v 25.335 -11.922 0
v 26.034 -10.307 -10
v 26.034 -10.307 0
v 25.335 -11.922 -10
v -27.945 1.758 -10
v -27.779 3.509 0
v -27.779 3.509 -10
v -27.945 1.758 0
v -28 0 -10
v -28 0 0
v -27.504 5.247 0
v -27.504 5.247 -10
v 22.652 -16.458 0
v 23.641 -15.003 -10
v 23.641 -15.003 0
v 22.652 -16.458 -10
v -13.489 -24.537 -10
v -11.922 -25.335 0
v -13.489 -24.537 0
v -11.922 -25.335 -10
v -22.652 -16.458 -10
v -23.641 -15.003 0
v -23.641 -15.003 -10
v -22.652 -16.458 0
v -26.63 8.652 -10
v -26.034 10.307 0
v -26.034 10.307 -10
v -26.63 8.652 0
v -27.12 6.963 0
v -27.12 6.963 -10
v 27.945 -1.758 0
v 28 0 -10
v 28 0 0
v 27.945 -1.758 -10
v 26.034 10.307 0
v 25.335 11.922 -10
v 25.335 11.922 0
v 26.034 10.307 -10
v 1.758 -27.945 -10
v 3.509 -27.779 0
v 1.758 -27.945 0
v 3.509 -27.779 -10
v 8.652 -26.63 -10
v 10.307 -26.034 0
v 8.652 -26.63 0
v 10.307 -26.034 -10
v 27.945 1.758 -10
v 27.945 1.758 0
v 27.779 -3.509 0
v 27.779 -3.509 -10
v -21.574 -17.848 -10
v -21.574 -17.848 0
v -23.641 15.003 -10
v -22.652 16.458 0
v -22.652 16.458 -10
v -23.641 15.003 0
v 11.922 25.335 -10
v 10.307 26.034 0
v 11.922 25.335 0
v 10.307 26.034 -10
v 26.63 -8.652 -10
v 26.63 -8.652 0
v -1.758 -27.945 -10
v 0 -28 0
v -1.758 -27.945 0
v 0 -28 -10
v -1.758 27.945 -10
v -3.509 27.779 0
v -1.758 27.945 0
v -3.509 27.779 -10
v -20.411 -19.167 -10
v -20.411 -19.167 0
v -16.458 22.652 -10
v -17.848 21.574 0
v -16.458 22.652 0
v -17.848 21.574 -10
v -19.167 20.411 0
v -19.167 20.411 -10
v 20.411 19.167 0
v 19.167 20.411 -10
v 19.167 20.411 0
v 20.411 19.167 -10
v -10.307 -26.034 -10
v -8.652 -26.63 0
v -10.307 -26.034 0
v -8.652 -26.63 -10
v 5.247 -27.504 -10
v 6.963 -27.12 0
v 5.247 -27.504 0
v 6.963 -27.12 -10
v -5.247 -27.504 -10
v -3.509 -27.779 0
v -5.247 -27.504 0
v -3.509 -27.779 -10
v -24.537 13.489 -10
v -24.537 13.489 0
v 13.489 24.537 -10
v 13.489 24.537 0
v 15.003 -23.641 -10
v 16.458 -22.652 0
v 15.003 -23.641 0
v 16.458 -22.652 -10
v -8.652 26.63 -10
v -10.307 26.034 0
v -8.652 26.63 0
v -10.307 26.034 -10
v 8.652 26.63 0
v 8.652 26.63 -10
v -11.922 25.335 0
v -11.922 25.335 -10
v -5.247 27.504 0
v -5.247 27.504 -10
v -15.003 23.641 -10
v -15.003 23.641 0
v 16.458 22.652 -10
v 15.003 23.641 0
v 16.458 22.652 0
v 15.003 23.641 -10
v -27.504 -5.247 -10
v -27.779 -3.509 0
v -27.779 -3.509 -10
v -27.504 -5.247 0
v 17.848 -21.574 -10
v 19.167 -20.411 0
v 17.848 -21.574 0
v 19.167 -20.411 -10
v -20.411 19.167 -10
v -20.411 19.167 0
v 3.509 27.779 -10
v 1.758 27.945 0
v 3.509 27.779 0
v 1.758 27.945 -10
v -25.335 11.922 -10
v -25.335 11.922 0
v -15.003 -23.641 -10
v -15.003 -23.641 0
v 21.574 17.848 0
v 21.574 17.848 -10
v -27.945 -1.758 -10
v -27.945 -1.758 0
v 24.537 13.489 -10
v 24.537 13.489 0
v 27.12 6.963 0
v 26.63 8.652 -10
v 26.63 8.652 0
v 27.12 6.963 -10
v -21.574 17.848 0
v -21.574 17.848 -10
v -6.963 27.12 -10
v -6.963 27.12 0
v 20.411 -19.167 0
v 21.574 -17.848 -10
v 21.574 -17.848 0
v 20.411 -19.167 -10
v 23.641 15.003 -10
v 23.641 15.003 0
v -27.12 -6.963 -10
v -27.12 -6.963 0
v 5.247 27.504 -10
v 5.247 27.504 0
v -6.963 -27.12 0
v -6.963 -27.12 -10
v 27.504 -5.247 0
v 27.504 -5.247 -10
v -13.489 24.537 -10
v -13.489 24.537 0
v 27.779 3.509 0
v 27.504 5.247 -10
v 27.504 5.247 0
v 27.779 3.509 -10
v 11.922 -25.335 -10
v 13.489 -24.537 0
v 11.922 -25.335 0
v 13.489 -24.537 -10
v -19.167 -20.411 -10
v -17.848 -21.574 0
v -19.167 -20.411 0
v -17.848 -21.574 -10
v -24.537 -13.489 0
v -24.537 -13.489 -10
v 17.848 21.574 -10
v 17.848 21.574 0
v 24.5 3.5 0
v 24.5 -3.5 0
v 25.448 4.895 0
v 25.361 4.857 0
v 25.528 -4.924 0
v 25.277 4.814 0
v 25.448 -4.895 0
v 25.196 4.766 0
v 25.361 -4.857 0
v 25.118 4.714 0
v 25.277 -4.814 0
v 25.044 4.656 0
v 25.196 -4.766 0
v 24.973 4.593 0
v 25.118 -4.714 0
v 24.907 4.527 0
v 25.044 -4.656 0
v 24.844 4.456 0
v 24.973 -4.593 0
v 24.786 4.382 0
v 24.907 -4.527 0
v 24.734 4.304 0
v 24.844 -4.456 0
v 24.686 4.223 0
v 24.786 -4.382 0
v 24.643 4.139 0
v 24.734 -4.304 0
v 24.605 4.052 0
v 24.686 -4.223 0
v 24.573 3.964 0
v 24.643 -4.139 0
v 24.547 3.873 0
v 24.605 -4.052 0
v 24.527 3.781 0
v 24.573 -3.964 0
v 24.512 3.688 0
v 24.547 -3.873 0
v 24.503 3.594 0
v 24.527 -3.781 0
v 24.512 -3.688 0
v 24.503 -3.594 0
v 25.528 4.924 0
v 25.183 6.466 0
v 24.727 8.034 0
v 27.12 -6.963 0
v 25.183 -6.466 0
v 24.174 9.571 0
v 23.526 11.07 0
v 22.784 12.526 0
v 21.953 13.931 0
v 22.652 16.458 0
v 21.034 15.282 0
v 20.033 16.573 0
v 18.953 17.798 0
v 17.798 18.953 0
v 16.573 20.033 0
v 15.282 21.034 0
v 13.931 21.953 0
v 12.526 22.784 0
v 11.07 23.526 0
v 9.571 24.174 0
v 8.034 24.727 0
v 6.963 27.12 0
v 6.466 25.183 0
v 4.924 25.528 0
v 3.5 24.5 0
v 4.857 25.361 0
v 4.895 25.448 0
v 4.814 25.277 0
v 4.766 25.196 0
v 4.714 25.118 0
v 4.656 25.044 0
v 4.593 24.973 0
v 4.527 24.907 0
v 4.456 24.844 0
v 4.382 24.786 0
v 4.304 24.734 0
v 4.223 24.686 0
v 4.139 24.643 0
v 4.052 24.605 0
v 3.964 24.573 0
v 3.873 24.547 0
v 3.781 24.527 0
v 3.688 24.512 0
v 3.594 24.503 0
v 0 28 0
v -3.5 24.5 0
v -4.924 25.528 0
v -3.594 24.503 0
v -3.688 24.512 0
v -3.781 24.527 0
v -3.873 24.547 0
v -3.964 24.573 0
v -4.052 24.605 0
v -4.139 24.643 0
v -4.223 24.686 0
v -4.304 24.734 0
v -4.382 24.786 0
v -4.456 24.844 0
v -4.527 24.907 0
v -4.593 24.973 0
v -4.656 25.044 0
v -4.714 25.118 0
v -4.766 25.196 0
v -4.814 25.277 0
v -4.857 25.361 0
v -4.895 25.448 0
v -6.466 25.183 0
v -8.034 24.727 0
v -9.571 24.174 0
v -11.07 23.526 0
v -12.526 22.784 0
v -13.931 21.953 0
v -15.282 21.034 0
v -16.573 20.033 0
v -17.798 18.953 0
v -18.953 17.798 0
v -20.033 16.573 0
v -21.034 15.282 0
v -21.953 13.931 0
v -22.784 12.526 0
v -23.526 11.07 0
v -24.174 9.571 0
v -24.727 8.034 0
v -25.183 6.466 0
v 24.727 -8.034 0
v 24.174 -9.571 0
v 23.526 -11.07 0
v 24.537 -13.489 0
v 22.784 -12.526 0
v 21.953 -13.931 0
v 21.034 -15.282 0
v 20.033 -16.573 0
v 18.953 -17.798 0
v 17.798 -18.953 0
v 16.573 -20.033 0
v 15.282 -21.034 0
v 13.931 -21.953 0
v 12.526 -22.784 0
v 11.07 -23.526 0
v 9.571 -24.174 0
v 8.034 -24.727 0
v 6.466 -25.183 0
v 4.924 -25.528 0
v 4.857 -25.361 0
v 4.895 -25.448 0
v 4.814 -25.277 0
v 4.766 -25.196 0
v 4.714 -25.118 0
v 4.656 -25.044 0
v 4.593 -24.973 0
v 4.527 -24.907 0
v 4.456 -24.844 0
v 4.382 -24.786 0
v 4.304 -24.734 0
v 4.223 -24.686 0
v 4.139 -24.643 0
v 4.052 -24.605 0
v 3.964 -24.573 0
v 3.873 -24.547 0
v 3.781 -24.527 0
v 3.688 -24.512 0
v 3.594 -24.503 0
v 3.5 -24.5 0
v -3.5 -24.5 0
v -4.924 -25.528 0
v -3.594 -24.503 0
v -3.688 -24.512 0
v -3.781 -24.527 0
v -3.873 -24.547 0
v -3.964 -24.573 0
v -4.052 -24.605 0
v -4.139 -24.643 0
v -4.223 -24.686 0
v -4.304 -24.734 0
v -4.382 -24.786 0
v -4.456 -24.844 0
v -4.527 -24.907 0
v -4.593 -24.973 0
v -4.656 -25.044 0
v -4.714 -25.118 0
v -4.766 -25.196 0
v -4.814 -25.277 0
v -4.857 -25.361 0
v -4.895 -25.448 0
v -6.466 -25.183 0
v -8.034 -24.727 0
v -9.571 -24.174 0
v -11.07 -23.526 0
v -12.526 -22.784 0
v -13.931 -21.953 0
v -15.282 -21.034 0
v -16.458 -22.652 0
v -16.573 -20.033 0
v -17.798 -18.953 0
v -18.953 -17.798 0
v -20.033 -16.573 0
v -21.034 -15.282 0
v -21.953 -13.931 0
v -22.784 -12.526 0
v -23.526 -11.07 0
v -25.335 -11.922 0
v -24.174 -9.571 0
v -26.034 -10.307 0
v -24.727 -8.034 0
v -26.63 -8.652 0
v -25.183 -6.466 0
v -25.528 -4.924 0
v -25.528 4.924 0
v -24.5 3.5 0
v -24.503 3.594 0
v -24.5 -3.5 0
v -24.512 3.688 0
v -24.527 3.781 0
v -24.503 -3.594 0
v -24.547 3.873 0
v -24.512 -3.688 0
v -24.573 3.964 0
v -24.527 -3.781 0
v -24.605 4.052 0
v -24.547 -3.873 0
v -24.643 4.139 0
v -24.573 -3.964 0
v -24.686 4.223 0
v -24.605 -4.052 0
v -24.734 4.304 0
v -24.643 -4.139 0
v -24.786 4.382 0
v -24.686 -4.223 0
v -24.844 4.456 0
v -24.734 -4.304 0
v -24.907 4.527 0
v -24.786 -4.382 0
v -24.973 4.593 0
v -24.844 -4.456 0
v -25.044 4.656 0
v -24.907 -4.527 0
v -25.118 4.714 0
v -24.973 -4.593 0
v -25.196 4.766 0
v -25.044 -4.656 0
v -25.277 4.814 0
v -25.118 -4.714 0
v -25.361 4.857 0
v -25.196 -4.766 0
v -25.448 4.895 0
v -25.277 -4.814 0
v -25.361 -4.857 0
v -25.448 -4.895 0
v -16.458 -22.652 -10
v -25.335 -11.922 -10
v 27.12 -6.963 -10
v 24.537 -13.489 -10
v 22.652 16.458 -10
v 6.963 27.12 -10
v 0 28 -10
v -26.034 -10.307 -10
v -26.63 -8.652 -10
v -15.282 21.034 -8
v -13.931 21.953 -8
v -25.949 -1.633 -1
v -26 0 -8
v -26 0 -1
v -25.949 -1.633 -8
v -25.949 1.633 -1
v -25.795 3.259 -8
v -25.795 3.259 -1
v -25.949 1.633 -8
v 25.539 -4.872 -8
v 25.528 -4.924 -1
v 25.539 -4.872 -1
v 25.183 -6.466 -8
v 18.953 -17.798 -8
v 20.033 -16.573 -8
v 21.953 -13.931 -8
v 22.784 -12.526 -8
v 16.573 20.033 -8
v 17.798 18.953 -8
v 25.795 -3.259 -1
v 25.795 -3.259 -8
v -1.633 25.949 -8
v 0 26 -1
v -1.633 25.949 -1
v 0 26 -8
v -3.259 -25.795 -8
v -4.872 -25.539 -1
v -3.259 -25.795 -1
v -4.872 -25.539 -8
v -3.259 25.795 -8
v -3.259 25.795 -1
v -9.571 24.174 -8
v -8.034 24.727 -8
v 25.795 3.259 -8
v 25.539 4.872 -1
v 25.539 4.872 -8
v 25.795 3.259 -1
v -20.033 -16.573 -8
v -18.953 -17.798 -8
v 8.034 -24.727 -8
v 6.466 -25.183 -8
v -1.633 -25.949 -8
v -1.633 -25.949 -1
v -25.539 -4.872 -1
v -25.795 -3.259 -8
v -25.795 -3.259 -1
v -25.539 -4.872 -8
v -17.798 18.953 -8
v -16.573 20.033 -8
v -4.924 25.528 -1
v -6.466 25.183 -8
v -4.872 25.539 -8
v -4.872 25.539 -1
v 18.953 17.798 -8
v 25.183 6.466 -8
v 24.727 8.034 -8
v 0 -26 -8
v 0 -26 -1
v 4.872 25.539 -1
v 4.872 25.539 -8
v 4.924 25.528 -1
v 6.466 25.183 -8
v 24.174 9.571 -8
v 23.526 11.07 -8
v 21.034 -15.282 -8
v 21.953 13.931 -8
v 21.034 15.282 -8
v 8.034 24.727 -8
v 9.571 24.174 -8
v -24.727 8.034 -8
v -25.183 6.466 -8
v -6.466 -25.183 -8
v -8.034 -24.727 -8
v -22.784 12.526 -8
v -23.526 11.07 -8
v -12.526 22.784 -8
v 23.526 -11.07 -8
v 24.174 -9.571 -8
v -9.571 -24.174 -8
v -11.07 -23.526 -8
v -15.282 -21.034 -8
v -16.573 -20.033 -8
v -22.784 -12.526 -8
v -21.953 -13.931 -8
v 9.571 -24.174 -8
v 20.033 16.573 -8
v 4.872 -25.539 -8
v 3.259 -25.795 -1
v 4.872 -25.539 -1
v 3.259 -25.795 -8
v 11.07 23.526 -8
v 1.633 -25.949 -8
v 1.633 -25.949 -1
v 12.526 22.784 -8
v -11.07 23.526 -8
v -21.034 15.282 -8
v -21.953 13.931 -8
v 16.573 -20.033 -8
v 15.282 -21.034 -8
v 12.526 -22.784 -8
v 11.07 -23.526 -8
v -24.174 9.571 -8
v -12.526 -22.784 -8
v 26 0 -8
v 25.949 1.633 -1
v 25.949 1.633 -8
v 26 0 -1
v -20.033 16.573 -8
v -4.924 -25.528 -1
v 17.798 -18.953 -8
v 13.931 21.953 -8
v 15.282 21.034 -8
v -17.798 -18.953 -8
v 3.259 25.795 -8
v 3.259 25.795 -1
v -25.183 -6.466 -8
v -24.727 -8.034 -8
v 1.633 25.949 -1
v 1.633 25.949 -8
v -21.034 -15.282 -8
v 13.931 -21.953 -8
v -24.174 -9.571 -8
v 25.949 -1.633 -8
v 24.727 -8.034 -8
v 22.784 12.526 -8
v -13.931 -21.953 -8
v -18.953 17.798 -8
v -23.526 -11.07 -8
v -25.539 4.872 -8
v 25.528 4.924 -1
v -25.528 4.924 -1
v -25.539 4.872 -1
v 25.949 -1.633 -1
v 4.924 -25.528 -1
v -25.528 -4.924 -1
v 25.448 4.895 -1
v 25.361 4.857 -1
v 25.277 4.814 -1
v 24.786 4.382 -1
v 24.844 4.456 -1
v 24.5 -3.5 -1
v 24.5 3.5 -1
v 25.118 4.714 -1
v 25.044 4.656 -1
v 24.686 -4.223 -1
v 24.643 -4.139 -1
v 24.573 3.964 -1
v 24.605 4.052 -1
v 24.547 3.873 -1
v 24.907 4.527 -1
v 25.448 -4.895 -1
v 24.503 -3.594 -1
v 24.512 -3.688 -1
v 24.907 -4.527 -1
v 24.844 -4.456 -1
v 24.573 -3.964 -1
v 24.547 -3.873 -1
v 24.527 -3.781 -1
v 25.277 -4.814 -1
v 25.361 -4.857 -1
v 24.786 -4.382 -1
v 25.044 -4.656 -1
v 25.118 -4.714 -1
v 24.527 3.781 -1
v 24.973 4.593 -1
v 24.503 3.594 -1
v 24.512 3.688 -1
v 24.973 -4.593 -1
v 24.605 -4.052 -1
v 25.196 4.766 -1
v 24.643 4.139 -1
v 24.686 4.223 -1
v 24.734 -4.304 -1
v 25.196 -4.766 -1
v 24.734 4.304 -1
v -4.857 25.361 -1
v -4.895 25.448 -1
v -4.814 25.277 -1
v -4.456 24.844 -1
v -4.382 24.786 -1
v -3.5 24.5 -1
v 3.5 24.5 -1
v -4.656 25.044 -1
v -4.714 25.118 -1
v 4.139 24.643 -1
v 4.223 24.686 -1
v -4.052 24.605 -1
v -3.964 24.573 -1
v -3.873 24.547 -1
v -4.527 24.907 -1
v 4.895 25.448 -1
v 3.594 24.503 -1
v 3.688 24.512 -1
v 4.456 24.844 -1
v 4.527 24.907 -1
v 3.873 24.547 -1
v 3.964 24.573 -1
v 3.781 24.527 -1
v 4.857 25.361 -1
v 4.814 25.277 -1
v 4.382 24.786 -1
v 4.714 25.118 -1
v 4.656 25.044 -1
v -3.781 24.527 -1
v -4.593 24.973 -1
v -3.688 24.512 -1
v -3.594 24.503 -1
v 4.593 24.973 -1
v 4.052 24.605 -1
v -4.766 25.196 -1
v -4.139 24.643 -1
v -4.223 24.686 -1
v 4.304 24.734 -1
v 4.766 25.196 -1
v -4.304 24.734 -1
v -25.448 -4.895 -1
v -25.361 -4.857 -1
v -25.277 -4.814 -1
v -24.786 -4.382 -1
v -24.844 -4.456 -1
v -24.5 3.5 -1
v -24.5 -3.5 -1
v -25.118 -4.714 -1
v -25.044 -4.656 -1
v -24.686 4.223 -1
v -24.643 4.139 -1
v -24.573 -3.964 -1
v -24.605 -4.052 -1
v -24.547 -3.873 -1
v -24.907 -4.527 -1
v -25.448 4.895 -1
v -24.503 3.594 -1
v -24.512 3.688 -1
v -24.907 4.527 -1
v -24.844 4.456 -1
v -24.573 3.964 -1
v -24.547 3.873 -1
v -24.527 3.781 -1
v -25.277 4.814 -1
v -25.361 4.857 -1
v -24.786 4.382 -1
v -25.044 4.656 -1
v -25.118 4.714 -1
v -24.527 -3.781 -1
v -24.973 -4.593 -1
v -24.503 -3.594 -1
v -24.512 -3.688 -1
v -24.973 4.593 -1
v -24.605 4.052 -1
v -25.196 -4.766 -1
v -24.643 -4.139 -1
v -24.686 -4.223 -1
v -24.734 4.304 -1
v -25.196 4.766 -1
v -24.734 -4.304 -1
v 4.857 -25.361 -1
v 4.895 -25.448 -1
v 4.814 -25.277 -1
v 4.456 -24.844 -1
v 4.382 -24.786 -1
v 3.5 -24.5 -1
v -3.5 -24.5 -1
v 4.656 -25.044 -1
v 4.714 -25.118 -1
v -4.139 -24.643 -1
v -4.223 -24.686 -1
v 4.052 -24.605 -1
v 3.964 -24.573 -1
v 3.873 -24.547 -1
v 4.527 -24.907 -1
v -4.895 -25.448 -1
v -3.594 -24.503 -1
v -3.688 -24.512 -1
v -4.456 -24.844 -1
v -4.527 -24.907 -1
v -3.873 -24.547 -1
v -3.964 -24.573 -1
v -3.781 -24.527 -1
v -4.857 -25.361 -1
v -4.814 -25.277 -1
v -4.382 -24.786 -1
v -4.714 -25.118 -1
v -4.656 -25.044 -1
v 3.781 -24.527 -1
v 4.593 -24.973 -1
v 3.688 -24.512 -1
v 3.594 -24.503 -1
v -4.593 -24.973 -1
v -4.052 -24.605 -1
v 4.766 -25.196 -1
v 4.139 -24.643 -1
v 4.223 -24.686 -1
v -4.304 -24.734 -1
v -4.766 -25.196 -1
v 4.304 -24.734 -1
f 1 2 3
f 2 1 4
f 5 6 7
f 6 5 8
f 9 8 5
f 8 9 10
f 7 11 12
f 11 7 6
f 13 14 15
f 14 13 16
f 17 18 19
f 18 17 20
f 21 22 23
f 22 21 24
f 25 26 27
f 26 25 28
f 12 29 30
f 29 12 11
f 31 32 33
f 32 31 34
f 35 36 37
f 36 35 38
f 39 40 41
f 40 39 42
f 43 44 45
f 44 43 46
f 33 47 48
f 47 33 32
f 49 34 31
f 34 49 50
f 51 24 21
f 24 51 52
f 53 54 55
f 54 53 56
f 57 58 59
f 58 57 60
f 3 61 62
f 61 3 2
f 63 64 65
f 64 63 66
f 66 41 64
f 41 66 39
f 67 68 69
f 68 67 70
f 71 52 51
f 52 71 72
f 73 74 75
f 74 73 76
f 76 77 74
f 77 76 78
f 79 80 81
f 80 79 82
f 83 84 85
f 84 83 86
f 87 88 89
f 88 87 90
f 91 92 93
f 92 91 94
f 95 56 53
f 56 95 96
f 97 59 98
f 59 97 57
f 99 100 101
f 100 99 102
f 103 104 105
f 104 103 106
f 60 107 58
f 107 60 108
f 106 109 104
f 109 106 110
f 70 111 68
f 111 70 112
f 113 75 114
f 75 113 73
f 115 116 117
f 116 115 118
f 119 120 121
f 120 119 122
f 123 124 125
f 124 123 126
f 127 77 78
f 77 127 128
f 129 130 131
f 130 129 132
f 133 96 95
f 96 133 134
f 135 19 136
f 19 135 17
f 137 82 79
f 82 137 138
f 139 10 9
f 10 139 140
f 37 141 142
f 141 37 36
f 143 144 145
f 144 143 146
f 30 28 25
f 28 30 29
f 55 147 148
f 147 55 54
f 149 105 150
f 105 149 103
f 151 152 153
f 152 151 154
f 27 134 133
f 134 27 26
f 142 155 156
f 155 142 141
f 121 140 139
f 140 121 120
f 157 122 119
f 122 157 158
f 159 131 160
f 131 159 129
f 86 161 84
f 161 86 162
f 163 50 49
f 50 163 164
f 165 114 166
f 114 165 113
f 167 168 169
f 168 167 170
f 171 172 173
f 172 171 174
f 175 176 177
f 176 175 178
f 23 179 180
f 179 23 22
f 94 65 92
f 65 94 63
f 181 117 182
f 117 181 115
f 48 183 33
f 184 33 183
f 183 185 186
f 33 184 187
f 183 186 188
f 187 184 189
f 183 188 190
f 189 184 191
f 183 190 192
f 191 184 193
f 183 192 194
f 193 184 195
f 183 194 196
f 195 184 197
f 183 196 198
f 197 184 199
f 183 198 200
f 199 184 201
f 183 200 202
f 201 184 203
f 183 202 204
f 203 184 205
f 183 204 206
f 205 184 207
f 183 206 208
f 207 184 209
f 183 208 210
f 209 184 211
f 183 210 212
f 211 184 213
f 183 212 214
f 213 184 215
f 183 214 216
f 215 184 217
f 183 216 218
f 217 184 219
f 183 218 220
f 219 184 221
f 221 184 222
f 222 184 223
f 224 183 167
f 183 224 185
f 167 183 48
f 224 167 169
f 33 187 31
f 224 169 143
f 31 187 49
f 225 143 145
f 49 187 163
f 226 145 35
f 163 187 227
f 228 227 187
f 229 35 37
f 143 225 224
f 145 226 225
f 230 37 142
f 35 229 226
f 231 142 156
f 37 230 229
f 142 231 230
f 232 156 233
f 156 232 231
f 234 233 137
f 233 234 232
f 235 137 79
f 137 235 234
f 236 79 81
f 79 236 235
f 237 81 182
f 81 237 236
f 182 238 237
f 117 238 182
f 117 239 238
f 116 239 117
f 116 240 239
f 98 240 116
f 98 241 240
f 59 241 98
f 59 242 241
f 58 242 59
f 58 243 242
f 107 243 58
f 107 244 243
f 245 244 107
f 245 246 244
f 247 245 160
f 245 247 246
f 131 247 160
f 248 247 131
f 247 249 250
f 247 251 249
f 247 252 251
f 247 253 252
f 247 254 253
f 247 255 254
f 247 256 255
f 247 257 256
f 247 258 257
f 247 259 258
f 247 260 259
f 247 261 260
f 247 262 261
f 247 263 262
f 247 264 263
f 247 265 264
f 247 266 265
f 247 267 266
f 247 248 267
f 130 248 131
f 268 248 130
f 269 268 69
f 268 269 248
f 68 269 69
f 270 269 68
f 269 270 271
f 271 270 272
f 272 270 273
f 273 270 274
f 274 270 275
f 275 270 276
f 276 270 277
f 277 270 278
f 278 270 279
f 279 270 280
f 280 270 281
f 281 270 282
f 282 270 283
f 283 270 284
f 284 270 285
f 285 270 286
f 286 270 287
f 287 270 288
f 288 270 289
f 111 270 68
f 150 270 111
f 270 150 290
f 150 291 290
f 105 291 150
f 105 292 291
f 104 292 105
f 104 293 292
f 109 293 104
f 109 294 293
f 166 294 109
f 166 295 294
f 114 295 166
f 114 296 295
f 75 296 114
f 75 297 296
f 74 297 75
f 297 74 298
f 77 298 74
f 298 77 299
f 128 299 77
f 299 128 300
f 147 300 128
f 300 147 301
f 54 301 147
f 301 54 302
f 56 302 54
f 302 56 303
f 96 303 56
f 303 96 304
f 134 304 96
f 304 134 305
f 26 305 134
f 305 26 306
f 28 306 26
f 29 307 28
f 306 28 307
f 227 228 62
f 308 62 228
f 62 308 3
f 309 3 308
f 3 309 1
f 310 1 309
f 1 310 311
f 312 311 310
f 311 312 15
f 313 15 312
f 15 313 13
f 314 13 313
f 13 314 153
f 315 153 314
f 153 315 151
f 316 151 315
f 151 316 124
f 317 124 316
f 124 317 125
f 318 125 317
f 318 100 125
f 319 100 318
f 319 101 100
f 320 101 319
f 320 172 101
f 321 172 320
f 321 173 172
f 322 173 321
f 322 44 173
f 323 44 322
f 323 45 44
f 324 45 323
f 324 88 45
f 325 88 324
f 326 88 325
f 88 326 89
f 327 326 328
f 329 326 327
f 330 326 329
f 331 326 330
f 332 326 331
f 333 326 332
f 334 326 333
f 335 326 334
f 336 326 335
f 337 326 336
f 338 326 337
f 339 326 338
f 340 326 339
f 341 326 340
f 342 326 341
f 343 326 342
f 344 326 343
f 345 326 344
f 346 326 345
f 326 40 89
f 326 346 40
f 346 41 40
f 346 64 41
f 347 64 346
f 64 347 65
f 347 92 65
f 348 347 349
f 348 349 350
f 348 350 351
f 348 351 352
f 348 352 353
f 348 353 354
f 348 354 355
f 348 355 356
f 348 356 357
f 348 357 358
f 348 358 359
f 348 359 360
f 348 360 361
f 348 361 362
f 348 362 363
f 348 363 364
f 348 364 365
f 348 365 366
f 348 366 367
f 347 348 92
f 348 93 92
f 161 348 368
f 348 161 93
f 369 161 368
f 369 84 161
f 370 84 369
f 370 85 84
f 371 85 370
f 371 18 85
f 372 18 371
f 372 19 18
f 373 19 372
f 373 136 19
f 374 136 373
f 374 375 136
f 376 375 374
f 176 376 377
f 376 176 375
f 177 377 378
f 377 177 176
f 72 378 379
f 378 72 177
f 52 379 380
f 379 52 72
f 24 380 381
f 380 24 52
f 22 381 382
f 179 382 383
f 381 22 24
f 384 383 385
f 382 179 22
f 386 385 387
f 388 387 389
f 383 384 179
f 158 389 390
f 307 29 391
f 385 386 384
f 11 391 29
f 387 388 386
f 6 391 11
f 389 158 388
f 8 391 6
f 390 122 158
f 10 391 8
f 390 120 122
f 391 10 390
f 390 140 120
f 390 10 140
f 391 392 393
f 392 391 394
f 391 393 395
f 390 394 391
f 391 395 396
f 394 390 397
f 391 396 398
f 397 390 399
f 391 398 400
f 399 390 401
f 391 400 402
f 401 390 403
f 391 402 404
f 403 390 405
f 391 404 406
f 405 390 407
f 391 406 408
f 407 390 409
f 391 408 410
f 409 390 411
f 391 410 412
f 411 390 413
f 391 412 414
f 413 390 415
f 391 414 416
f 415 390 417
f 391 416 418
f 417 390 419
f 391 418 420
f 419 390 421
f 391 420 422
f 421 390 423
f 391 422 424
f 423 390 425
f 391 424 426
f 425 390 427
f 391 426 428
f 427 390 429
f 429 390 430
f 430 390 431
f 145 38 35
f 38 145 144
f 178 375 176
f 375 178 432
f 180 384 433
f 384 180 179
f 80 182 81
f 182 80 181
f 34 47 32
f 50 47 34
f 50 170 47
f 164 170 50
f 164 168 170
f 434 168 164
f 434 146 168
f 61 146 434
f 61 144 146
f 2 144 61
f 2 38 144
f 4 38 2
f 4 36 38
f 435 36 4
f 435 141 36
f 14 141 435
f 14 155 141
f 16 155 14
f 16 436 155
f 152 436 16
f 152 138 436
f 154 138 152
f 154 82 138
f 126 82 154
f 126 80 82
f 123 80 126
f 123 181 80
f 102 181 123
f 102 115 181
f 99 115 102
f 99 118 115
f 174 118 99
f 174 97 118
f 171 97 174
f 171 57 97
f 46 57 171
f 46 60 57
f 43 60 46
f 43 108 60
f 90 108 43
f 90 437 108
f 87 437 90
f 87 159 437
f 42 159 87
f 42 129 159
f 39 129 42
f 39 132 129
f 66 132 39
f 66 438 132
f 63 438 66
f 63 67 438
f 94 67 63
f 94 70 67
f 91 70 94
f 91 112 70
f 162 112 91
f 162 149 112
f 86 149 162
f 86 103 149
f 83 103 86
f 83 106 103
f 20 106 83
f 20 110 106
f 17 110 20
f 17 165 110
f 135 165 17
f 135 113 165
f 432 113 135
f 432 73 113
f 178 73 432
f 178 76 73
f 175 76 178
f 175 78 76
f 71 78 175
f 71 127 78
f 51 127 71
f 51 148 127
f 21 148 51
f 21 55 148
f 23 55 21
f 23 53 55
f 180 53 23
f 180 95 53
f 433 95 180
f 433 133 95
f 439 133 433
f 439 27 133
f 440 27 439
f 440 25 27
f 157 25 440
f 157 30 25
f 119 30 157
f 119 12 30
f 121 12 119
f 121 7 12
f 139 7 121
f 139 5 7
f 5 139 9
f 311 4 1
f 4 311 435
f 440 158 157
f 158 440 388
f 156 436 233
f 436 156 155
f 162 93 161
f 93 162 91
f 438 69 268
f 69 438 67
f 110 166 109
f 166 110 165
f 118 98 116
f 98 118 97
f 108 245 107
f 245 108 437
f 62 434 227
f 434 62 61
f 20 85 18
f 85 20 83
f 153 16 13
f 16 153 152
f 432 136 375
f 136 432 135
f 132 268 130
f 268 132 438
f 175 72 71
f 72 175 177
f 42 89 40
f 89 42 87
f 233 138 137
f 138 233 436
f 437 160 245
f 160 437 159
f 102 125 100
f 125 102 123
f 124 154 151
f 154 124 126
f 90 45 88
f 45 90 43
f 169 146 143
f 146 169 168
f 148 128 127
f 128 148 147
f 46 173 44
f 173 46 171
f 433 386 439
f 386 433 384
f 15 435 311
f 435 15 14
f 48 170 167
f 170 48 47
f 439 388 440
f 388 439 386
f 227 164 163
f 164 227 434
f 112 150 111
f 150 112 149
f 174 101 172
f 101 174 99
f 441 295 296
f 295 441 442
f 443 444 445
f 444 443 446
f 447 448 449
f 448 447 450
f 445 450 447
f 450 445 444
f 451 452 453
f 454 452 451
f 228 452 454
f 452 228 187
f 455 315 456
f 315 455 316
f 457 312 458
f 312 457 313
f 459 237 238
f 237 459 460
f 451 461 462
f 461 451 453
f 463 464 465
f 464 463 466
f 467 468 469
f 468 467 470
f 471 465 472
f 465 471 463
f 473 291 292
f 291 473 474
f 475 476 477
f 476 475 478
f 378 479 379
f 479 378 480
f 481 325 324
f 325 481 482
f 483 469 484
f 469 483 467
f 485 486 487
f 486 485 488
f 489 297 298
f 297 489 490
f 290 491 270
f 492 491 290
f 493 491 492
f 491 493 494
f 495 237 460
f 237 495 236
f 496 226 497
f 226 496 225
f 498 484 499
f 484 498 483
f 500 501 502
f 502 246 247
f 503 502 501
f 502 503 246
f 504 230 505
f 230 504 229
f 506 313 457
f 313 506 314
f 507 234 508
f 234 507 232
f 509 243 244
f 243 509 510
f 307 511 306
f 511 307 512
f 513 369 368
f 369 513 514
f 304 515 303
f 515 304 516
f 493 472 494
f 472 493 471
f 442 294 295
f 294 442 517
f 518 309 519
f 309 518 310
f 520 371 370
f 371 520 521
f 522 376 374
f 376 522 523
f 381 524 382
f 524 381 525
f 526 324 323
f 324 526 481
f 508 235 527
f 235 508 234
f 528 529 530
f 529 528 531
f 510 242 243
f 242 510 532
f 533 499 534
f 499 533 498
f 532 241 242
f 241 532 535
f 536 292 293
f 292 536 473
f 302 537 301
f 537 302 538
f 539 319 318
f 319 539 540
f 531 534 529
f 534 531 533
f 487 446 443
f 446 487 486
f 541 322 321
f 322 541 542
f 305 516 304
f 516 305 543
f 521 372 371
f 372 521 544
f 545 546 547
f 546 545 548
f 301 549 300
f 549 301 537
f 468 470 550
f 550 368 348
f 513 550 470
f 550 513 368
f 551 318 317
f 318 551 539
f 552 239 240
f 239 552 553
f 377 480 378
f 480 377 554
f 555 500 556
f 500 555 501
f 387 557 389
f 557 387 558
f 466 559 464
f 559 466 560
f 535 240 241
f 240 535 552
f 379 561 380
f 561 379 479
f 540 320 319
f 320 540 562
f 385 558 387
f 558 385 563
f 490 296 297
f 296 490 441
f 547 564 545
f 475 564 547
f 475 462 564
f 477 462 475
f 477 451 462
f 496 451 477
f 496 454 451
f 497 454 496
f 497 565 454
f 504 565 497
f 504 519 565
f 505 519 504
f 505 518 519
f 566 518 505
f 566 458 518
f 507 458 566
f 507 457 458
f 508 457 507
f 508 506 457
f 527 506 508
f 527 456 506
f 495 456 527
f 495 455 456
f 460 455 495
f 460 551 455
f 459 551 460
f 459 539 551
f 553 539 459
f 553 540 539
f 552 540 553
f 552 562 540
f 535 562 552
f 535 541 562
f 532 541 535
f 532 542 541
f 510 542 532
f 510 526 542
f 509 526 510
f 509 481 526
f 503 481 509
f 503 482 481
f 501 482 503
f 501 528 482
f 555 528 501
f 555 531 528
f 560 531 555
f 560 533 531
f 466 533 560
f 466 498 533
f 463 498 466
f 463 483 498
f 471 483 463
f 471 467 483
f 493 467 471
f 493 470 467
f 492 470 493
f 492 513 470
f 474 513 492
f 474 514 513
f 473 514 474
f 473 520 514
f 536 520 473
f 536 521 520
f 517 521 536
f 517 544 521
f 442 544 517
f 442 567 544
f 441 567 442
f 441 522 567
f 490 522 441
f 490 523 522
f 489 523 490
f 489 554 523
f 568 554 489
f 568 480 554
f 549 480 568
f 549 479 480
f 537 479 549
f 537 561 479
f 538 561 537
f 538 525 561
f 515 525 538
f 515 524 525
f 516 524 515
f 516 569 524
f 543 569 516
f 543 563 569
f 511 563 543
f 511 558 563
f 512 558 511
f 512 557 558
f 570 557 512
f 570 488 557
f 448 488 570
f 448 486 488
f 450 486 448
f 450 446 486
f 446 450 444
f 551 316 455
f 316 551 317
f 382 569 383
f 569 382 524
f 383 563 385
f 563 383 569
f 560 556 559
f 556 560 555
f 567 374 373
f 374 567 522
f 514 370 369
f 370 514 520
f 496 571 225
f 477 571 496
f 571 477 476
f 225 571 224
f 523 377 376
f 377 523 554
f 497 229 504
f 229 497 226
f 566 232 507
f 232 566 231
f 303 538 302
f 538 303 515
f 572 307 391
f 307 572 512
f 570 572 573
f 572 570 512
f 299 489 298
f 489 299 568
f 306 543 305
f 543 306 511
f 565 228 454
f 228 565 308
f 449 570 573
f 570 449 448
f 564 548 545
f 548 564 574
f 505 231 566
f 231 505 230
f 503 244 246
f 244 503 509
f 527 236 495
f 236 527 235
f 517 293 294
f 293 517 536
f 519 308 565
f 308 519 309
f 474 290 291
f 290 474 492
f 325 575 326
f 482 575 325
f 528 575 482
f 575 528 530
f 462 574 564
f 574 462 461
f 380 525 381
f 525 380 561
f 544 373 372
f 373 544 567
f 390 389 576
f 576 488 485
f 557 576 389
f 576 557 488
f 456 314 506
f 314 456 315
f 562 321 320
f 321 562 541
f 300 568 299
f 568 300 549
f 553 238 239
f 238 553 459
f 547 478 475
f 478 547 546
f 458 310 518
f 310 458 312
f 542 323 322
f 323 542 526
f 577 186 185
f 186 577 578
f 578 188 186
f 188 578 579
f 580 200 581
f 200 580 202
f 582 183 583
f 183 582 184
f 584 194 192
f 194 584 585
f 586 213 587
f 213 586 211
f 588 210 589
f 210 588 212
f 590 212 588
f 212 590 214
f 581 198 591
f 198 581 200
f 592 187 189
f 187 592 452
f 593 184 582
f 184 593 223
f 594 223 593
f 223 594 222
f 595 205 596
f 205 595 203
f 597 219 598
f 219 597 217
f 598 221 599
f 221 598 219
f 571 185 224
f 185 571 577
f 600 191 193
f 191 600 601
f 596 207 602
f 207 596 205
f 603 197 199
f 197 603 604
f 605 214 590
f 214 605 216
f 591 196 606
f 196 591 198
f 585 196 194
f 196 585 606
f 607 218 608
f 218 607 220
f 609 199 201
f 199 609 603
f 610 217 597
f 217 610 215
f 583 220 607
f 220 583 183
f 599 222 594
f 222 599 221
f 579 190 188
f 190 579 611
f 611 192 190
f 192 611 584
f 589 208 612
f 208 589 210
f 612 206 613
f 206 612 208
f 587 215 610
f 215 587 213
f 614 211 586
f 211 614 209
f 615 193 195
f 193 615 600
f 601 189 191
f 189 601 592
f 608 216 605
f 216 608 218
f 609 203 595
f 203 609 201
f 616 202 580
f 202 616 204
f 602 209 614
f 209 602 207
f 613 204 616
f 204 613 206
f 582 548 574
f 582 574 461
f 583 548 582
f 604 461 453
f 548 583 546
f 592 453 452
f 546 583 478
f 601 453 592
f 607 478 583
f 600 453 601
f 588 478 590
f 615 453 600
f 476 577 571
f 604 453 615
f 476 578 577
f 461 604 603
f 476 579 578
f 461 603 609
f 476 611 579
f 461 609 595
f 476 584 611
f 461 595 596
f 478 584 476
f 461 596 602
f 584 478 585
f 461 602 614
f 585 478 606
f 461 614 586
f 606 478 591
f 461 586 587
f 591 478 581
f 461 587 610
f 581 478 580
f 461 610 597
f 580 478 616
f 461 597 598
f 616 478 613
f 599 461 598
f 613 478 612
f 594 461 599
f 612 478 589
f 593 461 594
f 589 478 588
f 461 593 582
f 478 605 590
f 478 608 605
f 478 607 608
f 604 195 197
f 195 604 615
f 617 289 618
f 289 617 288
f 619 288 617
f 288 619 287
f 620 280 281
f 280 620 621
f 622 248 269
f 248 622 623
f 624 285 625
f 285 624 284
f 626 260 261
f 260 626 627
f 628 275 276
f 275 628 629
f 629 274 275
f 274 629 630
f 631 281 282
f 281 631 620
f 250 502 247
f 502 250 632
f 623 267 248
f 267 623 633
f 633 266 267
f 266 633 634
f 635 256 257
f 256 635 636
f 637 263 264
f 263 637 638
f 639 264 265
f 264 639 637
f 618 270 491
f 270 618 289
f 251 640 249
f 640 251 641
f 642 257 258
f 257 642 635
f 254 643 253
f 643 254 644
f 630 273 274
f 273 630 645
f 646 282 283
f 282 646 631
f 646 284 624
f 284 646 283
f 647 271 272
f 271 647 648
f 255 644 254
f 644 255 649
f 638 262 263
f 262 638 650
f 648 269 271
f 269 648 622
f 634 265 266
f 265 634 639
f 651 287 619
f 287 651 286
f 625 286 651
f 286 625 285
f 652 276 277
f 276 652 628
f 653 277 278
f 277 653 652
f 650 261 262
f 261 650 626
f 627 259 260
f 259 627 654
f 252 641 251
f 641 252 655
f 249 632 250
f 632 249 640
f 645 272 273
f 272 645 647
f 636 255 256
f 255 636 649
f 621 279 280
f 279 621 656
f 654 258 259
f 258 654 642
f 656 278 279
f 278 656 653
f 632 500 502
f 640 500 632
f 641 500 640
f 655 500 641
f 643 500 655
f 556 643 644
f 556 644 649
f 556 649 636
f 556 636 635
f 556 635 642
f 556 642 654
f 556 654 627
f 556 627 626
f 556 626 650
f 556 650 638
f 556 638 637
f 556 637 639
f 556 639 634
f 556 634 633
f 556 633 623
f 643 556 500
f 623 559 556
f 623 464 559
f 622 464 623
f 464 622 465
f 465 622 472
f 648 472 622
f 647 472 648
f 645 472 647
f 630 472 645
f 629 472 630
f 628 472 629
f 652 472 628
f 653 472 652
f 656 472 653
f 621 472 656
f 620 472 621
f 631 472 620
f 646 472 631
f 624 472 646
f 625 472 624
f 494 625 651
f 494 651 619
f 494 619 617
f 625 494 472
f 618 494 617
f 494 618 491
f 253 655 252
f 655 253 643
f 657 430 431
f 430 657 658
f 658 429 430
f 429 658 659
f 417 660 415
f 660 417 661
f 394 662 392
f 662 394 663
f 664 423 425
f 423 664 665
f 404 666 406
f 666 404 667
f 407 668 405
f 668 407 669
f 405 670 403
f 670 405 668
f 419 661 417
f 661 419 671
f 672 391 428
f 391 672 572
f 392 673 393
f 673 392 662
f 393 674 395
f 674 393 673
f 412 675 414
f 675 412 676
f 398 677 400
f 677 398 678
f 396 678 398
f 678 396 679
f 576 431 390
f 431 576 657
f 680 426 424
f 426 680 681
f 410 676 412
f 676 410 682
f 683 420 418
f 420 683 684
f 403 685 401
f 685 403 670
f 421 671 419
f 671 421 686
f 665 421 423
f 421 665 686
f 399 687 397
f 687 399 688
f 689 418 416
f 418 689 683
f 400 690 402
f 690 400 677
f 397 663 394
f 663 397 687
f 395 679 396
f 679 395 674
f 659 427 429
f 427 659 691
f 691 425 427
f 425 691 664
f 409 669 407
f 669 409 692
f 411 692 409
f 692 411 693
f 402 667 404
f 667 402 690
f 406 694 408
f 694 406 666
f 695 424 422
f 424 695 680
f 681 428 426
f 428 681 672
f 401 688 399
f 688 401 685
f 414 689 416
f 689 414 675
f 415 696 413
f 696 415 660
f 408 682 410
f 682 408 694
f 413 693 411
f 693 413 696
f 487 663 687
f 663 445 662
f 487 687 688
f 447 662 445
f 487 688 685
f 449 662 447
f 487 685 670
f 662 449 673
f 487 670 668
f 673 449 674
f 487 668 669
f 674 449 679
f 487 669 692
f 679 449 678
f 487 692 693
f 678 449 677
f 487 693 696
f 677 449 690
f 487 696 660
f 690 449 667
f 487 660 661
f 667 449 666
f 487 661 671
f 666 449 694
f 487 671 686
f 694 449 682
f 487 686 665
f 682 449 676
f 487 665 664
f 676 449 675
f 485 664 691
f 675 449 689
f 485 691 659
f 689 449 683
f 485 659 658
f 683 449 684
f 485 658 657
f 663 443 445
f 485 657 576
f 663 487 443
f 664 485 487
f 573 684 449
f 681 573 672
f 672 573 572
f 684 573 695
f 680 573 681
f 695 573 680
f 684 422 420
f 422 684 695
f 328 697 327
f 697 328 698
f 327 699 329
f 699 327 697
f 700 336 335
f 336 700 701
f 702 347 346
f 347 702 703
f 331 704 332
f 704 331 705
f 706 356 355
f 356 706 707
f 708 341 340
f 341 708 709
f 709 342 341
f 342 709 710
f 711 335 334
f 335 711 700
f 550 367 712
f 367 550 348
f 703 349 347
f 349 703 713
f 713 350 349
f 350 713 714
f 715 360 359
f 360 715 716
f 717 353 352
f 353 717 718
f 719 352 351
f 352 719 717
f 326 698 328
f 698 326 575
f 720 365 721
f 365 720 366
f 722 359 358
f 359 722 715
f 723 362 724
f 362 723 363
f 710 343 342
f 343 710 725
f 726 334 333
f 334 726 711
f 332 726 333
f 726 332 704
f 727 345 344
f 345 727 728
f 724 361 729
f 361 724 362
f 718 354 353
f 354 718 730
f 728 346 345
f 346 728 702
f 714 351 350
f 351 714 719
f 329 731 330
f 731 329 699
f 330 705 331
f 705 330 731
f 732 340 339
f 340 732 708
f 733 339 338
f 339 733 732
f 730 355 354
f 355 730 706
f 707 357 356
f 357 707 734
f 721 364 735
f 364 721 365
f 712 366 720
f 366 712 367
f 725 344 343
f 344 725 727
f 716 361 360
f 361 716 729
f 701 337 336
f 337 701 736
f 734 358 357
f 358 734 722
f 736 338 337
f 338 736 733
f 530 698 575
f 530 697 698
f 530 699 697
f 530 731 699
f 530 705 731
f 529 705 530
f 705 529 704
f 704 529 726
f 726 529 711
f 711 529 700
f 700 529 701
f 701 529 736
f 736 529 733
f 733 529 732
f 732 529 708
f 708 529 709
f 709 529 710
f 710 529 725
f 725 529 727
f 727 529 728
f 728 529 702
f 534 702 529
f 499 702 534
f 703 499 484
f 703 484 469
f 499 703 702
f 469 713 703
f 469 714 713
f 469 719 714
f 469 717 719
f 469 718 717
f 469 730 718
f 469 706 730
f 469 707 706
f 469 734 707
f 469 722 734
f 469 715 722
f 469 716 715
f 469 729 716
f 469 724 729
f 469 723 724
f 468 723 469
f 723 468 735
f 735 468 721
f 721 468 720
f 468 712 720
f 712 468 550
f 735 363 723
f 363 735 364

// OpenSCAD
$fn = 100;
diameter_lid = 56;
wall_size = 2;
notch_size = 3;
notch_length = 10;
notch_number = 4;
notch_height = 1;
height_lid = 10;
angle = 360 / notch_number;


rotate(180,[0,1,0])
difference(){
cylinder(h=height_lid, d=diameter_lid); //outer lid
cylinder(h=height_lid - wall_size, d=diameter_lid - 2*wall_size); //inner_lid
}

module Notch(length, width, height){
    difference(){
        linear_extrude(height=height)
    hull() {
        translate([0,length/2-width/2,0]) circle(width/2);
        translate([0, -length/2+width/2,0]) circle(width/2);
    }
    translate([-width/2,0, height/2]) cube([width,length,height], center=true);
    }
}

for (i = [0:notch_number-1]){
    X = ((diameter_lid/2) - wall_size) * cos(angle*i); //Kreisgleichung X = r * cos(phi)
    Y = ((diameter_lid/2) - wall_size) * sin(angle*i);

    translate([X,Y,- notch_height]) rotate(180,[0,0,1])
    rotate(angle*i,[0,0,1]) Notch(notch_length,notch_size,notch_height);
}

*Notch(notch_length,notch_size,notch_height);
